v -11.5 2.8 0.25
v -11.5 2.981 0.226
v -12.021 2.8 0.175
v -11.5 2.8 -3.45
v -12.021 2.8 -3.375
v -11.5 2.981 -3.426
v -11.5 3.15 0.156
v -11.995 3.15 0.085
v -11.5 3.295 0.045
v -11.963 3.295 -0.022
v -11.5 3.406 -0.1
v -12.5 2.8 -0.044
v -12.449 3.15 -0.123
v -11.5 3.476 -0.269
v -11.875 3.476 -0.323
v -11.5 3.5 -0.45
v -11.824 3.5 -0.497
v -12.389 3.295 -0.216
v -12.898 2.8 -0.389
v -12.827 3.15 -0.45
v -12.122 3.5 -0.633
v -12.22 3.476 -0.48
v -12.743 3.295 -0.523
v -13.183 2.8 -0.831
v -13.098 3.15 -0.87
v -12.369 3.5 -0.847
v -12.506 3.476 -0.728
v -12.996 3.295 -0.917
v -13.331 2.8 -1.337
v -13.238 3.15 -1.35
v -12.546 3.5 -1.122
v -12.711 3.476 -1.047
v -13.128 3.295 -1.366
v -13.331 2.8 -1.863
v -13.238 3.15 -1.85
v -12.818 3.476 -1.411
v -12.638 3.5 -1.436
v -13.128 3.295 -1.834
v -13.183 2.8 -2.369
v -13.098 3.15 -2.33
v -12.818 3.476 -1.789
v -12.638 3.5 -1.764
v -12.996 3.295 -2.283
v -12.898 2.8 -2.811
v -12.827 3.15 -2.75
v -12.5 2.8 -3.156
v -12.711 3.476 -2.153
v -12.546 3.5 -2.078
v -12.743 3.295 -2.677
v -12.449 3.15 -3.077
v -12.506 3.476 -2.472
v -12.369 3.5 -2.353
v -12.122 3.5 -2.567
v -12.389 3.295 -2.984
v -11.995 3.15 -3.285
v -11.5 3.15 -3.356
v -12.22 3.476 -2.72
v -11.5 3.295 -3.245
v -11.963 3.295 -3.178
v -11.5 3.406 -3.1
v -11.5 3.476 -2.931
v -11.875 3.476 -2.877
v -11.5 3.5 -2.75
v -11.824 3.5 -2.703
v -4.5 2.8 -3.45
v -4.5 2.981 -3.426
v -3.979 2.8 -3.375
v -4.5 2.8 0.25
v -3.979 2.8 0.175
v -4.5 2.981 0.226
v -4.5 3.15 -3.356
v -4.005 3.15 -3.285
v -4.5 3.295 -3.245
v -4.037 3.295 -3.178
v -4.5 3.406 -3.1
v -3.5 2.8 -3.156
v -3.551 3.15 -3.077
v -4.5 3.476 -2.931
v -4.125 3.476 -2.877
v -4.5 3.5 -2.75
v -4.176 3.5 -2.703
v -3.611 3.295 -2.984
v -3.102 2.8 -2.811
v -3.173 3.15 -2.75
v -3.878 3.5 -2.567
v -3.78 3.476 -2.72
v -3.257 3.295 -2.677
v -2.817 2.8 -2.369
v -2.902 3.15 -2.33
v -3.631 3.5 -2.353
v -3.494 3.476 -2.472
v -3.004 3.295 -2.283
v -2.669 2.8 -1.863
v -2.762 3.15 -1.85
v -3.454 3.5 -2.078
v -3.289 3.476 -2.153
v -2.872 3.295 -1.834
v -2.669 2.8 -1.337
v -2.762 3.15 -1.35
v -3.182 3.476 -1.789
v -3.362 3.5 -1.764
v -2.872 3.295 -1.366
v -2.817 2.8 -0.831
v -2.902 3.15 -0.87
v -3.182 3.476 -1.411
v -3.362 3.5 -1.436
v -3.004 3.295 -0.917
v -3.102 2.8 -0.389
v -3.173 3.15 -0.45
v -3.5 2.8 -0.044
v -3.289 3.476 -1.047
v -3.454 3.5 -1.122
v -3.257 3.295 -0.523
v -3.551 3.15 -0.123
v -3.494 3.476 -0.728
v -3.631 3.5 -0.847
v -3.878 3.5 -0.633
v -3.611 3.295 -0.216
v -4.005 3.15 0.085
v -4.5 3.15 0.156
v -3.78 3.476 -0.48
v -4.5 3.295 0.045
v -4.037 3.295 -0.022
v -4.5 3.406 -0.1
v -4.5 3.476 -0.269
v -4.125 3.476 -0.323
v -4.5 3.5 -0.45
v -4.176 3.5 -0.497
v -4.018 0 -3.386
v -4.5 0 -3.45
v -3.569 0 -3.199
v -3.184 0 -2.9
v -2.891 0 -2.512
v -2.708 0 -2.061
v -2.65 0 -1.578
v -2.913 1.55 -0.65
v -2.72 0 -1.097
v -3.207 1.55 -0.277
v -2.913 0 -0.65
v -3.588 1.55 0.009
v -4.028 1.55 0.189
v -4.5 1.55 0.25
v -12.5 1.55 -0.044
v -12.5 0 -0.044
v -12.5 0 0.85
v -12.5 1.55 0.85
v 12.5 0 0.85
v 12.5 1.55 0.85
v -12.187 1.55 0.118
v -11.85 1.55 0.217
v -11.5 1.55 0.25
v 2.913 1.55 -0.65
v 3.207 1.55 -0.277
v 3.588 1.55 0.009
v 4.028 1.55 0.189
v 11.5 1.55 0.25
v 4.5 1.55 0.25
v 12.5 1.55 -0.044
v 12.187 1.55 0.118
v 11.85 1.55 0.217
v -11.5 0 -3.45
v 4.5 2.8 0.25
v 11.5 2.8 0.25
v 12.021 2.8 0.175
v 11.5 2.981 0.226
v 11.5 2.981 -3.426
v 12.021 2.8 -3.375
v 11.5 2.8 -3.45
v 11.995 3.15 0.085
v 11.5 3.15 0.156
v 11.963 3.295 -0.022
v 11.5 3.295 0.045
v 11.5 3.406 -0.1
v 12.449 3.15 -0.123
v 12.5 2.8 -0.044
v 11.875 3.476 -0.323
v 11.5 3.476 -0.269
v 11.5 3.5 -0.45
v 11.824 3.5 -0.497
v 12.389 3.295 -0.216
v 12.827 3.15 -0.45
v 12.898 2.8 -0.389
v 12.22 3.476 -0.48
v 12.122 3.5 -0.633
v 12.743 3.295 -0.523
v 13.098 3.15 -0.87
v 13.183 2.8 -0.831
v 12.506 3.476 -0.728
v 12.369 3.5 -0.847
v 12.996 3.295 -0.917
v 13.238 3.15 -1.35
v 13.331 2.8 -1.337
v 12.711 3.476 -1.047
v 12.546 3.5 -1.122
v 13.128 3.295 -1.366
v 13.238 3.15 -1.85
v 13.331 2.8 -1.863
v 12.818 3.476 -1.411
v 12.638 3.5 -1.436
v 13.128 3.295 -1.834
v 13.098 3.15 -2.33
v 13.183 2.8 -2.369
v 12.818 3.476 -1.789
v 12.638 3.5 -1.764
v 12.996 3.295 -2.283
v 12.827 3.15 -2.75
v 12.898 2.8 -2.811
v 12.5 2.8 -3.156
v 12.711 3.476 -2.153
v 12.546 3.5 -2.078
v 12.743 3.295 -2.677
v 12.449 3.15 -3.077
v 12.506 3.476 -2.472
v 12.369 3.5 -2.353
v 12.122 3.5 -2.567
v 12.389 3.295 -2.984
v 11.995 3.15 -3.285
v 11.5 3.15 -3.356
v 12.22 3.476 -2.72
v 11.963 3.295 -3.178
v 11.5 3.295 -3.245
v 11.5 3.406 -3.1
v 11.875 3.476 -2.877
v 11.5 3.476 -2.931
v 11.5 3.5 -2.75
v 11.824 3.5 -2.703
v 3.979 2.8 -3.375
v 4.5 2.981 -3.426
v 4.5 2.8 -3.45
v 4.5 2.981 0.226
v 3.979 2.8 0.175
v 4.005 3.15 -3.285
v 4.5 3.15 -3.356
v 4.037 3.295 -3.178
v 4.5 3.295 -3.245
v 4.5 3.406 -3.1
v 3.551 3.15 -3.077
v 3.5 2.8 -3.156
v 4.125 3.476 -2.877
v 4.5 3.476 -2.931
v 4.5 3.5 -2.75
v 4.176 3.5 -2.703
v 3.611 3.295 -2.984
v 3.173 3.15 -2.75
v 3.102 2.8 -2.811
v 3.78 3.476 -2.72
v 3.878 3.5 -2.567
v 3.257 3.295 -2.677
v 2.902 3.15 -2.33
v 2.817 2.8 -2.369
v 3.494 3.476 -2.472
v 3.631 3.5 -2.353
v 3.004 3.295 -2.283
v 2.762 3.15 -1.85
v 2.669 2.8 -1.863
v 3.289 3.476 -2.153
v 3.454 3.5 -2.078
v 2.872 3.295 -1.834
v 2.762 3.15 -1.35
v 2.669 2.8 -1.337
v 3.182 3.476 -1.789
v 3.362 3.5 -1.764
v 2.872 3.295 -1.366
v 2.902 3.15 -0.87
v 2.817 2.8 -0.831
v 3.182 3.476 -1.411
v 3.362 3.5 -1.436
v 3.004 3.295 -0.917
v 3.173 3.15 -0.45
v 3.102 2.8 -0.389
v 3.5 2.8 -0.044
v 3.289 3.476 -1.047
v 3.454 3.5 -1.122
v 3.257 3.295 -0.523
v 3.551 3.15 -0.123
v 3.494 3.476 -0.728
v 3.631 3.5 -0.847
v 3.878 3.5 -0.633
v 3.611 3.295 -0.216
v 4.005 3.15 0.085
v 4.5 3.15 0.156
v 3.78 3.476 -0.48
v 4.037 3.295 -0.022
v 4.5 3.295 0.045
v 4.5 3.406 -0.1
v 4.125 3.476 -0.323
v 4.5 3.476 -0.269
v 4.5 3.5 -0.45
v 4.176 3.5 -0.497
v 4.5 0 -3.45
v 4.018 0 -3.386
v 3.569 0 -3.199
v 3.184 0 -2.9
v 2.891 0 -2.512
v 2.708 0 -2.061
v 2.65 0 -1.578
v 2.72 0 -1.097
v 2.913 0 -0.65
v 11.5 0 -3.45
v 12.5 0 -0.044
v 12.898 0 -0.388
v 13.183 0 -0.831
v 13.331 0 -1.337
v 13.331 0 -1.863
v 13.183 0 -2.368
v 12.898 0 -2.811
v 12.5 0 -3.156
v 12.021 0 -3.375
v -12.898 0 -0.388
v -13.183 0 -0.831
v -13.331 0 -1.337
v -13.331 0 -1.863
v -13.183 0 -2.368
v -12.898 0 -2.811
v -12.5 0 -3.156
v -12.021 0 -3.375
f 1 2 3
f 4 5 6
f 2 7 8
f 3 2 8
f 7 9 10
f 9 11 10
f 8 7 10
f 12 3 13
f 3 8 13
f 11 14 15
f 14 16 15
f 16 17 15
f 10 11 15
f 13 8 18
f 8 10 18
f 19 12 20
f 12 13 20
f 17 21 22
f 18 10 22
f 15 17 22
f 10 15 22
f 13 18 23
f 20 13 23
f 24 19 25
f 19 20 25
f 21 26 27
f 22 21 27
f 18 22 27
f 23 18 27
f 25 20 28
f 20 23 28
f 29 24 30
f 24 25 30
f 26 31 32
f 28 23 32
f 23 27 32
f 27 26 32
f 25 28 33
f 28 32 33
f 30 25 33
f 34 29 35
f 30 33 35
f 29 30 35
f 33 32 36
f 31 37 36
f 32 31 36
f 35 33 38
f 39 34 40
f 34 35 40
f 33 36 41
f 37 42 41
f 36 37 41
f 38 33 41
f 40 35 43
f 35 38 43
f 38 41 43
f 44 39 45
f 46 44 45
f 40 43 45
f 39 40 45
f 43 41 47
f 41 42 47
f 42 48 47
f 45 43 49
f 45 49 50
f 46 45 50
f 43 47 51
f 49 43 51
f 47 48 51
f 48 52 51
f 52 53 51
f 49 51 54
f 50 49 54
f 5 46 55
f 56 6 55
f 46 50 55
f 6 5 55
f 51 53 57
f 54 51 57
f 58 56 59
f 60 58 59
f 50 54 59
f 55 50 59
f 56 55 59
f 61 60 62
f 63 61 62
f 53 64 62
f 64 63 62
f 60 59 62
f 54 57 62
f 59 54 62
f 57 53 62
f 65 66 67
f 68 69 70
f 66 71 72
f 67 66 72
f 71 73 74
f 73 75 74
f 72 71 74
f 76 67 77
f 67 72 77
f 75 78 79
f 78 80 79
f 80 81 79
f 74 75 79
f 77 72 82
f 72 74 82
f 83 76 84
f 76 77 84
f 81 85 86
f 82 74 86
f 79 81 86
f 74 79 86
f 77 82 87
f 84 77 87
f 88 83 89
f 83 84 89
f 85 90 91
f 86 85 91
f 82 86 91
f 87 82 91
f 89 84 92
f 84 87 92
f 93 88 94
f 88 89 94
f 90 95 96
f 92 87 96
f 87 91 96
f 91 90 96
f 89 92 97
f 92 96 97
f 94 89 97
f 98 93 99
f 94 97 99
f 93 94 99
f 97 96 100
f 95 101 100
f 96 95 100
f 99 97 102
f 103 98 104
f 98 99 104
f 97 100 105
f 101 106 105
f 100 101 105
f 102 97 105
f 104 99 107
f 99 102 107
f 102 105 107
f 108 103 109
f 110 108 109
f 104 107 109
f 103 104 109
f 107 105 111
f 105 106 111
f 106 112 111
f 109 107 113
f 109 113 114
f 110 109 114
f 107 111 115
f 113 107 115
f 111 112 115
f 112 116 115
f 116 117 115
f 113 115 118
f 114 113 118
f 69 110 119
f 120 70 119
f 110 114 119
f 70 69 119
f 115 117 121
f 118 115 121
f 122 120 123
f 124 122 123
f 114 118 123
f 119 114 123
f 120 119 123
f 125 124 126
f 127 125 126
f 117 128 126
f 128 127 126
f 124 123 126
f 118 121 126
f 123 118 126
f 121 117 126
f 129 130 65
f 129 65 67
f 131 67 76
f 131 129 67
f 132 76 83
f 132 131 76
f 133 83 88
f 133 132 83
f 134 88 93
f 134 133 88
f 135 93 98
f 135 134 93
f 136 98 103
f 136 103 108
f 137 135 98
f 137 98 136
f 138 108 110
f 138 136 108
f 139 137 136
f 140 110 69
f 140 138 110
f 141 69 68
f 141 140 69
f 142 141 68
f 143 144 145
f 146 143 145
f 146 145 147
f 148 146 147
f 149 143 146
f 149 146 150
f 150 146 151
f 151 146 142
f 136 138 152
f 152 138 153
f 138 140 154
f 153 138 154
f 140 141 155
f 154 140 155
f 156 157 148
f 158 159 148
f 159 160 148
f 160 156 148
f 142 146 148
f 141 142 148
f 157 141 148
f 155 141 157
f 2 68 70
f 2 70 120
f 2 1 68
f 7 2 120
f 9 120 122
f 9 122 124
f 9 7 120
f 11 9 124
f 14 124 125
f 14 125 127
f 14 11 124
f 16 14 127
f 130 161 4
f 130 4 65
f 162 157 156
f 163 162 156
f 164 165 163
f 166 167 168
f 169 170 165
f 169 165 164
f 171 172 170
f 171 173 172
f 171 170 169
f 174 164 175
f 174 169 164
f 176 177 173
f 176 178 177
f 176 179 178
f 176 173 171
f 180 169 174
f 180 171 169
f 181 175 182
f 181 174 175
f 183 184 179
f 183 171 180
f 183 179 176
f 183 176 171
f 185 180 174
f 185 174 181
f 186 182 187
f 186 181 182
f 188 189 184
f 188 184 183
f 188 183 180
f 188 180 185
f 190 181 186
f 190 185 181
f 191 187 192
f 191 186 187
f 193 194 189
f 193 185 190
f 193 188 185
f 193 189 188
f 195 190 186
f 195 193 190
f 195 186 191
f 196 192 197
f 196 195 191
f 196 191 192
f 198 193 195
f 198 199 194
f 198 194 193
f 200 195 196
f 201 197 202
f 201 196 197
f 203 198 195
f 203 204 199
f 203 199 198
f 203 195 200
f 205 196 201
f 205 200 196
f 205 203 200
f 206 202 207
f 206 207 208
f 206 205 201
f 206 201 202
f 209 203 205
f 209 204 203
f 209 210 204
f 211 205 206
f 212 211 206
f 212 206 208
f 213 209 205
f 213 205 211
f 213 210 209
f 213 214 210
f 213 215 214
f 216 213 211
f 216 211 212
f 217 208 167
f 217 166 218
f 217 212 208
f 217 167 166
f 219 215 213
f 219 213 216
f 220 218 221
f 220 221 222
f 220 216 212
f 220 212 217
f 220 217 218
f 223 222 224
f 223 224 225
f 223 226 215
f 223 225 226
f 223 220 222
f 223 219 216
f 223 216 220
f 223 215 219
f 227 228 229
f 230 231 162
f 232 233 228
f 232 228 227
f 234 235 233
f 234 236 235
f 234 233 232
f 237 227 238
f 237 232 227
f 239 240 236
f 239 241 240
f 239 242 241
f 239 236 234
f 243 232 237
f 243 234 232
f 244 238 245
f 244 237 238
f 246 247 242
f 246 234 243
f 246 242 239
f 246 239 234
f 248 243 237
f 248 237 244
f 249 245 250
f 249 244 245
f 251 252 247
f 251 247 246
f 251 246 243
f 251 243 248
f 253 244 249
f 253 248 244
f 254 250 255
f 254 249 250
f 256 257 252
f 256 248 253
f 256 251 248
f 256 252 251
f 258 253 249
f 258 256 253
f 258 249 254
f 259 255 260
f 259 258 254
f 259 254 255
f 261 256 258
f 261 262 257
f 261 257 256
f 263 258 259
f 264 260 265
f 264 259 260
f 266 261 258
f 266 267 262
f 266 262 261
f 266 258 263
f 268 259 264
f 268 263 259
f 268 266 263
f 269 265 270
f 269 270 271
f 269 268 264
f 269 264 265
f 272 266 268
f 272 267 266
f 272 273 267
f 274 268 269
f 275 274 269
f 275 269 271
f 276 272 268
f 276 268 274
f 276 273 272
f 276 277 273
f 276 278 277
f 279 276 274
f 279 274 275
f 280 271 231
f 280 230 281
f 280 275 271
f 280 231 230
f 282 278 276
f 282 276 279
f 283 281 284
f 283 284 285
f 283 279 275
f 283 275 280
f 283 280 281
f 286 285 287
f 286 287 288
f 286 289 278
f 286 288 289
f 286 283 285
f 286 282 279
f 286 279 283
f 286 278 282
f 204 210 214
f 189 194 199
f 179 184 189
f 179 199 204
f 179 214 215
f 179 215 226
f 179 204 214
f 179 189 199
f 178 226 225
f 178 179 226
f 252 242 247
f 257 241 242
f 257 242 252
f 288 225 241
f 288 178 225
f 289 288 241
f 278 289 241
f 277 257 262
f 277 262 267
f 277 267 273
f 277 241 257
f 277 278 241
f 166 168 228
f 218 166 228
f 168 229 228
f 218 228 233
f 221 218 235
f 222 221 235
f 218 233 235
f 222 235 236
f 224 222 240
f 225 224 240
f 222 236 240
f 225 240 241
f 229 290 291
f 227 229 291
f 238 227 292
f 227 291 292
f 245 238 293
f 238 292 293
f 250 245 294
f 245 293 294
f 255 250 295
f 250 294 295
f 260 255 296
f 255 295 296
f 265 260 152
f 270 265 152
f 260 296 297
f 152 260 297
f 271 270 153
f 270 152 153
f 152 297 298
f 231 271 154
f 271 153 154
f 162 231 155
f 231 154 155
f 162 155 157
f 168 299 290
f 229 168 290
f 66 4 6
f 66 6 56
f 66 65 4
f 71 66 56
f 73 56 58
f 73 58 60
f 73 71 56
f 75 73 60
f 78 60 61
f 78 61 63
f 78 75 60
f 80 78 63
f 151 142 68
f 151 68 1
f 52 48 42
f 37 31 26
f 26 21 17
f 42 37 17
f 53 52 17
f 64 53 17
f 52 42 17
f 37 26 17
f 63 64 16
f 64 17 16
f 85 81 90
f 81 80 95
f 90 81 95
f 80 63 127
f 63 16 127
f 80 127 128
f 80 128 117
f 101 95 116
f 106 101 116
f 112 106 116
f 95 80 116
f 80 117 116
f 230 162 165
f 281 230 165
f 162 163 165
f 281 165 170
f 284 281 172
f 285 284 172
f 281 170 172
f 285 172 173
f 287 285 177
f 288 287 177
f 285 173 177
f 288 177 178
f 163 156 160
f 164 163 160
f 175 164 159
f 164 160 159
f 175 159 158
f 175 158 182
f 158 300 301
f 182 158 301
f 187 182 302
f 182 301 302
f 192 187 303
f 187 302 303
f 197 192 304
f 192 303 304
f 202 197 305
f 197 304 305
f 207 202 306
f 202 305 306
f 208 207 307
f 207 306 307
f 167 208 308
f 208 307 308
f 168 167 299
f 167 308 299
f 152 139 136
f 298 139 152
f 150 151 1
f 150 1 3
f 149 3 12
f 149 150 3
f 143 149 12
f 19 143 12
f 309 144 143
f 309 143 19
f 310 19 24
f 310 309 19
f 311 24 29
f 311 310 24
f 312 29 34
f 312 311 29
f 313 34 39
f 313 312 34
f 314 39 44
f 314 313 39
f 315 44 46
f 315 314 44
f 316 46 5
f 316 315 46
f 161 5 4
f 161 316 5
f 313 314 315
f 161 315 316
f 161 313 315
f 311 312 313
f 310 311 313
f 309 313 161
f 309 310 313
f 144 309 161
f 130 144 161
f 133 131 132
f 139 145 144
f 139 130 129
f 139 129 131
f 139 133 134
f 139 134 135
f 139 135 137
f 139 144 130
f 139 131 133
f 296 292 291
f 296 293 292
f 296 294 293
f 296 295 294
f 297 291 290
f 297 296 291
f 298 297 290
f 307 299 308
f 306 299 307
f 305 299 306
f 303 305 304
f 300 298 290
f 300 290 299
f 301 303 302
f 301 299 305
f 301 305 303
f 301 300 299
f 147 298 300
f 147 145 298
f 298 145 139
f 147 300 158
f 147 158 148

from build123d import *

# Parameters (mm, degrees)
SKETCH007_W  = 25
SKETCH007_H  = 1.5
PAD001_DEPTH = 1.55
PAD002_DEPTH = 3.5
FILLET002_R  = 0.7


with BuildPart() as part:
    # Sketch007 → Pad001 (new body)
    with BuildSketch(Plane.XZ):
        with Locations((0, 0.1)):
            Rectangle(SKETCH007_W, SKETCH007_H)
    extrude(amount=-PAD001_DEPTH)

    # Sketch008 → Pad002 (join)
    with BuildSketch(Plane.XZ):
        with BuildLine():
            ThreePointArc((-11.5, 0.25), (-13.35, -1.6), (-11.5, -3.45))
            Line((-11.5, -3.45), (-4.5, -3.45))
            ThreePointArc((-4.5, -3.45), (-2.65, -1.6), (-4.5, 0.25))
            Line((-4.5, 0.25), (-11.5, 0.25))
        make_face()
    pad002 = extrude(amount=-PAD002_DEPTH)

    # Mirrored001: Pad002 across Sketch008 V_Axis
    add(pad002.mirror(Plane(origin=(0, 0, 0), x_dir=(0, -1, 0), z_dir=(1, 0, 0))))

    # Fillet002
    fillet002_edges = [part.edges().sort_by_distance(p)[0] for p in [
        (13.35, 3.5, -1.6),
        (8, 3.5, -3.45),
        (2.65, 3.5, -1.6),
        (8, 3.5, 0.25),
        (-13.35, 3.5, -1.6),
        (-8, 3.5, -3.45),
        (-2.65, 3.5, -1.6),
        (-8, 3.5, 0.25),
    ]]
    fillet(fillet002_edges, radius=FILLET002_R)


solid = part.part
